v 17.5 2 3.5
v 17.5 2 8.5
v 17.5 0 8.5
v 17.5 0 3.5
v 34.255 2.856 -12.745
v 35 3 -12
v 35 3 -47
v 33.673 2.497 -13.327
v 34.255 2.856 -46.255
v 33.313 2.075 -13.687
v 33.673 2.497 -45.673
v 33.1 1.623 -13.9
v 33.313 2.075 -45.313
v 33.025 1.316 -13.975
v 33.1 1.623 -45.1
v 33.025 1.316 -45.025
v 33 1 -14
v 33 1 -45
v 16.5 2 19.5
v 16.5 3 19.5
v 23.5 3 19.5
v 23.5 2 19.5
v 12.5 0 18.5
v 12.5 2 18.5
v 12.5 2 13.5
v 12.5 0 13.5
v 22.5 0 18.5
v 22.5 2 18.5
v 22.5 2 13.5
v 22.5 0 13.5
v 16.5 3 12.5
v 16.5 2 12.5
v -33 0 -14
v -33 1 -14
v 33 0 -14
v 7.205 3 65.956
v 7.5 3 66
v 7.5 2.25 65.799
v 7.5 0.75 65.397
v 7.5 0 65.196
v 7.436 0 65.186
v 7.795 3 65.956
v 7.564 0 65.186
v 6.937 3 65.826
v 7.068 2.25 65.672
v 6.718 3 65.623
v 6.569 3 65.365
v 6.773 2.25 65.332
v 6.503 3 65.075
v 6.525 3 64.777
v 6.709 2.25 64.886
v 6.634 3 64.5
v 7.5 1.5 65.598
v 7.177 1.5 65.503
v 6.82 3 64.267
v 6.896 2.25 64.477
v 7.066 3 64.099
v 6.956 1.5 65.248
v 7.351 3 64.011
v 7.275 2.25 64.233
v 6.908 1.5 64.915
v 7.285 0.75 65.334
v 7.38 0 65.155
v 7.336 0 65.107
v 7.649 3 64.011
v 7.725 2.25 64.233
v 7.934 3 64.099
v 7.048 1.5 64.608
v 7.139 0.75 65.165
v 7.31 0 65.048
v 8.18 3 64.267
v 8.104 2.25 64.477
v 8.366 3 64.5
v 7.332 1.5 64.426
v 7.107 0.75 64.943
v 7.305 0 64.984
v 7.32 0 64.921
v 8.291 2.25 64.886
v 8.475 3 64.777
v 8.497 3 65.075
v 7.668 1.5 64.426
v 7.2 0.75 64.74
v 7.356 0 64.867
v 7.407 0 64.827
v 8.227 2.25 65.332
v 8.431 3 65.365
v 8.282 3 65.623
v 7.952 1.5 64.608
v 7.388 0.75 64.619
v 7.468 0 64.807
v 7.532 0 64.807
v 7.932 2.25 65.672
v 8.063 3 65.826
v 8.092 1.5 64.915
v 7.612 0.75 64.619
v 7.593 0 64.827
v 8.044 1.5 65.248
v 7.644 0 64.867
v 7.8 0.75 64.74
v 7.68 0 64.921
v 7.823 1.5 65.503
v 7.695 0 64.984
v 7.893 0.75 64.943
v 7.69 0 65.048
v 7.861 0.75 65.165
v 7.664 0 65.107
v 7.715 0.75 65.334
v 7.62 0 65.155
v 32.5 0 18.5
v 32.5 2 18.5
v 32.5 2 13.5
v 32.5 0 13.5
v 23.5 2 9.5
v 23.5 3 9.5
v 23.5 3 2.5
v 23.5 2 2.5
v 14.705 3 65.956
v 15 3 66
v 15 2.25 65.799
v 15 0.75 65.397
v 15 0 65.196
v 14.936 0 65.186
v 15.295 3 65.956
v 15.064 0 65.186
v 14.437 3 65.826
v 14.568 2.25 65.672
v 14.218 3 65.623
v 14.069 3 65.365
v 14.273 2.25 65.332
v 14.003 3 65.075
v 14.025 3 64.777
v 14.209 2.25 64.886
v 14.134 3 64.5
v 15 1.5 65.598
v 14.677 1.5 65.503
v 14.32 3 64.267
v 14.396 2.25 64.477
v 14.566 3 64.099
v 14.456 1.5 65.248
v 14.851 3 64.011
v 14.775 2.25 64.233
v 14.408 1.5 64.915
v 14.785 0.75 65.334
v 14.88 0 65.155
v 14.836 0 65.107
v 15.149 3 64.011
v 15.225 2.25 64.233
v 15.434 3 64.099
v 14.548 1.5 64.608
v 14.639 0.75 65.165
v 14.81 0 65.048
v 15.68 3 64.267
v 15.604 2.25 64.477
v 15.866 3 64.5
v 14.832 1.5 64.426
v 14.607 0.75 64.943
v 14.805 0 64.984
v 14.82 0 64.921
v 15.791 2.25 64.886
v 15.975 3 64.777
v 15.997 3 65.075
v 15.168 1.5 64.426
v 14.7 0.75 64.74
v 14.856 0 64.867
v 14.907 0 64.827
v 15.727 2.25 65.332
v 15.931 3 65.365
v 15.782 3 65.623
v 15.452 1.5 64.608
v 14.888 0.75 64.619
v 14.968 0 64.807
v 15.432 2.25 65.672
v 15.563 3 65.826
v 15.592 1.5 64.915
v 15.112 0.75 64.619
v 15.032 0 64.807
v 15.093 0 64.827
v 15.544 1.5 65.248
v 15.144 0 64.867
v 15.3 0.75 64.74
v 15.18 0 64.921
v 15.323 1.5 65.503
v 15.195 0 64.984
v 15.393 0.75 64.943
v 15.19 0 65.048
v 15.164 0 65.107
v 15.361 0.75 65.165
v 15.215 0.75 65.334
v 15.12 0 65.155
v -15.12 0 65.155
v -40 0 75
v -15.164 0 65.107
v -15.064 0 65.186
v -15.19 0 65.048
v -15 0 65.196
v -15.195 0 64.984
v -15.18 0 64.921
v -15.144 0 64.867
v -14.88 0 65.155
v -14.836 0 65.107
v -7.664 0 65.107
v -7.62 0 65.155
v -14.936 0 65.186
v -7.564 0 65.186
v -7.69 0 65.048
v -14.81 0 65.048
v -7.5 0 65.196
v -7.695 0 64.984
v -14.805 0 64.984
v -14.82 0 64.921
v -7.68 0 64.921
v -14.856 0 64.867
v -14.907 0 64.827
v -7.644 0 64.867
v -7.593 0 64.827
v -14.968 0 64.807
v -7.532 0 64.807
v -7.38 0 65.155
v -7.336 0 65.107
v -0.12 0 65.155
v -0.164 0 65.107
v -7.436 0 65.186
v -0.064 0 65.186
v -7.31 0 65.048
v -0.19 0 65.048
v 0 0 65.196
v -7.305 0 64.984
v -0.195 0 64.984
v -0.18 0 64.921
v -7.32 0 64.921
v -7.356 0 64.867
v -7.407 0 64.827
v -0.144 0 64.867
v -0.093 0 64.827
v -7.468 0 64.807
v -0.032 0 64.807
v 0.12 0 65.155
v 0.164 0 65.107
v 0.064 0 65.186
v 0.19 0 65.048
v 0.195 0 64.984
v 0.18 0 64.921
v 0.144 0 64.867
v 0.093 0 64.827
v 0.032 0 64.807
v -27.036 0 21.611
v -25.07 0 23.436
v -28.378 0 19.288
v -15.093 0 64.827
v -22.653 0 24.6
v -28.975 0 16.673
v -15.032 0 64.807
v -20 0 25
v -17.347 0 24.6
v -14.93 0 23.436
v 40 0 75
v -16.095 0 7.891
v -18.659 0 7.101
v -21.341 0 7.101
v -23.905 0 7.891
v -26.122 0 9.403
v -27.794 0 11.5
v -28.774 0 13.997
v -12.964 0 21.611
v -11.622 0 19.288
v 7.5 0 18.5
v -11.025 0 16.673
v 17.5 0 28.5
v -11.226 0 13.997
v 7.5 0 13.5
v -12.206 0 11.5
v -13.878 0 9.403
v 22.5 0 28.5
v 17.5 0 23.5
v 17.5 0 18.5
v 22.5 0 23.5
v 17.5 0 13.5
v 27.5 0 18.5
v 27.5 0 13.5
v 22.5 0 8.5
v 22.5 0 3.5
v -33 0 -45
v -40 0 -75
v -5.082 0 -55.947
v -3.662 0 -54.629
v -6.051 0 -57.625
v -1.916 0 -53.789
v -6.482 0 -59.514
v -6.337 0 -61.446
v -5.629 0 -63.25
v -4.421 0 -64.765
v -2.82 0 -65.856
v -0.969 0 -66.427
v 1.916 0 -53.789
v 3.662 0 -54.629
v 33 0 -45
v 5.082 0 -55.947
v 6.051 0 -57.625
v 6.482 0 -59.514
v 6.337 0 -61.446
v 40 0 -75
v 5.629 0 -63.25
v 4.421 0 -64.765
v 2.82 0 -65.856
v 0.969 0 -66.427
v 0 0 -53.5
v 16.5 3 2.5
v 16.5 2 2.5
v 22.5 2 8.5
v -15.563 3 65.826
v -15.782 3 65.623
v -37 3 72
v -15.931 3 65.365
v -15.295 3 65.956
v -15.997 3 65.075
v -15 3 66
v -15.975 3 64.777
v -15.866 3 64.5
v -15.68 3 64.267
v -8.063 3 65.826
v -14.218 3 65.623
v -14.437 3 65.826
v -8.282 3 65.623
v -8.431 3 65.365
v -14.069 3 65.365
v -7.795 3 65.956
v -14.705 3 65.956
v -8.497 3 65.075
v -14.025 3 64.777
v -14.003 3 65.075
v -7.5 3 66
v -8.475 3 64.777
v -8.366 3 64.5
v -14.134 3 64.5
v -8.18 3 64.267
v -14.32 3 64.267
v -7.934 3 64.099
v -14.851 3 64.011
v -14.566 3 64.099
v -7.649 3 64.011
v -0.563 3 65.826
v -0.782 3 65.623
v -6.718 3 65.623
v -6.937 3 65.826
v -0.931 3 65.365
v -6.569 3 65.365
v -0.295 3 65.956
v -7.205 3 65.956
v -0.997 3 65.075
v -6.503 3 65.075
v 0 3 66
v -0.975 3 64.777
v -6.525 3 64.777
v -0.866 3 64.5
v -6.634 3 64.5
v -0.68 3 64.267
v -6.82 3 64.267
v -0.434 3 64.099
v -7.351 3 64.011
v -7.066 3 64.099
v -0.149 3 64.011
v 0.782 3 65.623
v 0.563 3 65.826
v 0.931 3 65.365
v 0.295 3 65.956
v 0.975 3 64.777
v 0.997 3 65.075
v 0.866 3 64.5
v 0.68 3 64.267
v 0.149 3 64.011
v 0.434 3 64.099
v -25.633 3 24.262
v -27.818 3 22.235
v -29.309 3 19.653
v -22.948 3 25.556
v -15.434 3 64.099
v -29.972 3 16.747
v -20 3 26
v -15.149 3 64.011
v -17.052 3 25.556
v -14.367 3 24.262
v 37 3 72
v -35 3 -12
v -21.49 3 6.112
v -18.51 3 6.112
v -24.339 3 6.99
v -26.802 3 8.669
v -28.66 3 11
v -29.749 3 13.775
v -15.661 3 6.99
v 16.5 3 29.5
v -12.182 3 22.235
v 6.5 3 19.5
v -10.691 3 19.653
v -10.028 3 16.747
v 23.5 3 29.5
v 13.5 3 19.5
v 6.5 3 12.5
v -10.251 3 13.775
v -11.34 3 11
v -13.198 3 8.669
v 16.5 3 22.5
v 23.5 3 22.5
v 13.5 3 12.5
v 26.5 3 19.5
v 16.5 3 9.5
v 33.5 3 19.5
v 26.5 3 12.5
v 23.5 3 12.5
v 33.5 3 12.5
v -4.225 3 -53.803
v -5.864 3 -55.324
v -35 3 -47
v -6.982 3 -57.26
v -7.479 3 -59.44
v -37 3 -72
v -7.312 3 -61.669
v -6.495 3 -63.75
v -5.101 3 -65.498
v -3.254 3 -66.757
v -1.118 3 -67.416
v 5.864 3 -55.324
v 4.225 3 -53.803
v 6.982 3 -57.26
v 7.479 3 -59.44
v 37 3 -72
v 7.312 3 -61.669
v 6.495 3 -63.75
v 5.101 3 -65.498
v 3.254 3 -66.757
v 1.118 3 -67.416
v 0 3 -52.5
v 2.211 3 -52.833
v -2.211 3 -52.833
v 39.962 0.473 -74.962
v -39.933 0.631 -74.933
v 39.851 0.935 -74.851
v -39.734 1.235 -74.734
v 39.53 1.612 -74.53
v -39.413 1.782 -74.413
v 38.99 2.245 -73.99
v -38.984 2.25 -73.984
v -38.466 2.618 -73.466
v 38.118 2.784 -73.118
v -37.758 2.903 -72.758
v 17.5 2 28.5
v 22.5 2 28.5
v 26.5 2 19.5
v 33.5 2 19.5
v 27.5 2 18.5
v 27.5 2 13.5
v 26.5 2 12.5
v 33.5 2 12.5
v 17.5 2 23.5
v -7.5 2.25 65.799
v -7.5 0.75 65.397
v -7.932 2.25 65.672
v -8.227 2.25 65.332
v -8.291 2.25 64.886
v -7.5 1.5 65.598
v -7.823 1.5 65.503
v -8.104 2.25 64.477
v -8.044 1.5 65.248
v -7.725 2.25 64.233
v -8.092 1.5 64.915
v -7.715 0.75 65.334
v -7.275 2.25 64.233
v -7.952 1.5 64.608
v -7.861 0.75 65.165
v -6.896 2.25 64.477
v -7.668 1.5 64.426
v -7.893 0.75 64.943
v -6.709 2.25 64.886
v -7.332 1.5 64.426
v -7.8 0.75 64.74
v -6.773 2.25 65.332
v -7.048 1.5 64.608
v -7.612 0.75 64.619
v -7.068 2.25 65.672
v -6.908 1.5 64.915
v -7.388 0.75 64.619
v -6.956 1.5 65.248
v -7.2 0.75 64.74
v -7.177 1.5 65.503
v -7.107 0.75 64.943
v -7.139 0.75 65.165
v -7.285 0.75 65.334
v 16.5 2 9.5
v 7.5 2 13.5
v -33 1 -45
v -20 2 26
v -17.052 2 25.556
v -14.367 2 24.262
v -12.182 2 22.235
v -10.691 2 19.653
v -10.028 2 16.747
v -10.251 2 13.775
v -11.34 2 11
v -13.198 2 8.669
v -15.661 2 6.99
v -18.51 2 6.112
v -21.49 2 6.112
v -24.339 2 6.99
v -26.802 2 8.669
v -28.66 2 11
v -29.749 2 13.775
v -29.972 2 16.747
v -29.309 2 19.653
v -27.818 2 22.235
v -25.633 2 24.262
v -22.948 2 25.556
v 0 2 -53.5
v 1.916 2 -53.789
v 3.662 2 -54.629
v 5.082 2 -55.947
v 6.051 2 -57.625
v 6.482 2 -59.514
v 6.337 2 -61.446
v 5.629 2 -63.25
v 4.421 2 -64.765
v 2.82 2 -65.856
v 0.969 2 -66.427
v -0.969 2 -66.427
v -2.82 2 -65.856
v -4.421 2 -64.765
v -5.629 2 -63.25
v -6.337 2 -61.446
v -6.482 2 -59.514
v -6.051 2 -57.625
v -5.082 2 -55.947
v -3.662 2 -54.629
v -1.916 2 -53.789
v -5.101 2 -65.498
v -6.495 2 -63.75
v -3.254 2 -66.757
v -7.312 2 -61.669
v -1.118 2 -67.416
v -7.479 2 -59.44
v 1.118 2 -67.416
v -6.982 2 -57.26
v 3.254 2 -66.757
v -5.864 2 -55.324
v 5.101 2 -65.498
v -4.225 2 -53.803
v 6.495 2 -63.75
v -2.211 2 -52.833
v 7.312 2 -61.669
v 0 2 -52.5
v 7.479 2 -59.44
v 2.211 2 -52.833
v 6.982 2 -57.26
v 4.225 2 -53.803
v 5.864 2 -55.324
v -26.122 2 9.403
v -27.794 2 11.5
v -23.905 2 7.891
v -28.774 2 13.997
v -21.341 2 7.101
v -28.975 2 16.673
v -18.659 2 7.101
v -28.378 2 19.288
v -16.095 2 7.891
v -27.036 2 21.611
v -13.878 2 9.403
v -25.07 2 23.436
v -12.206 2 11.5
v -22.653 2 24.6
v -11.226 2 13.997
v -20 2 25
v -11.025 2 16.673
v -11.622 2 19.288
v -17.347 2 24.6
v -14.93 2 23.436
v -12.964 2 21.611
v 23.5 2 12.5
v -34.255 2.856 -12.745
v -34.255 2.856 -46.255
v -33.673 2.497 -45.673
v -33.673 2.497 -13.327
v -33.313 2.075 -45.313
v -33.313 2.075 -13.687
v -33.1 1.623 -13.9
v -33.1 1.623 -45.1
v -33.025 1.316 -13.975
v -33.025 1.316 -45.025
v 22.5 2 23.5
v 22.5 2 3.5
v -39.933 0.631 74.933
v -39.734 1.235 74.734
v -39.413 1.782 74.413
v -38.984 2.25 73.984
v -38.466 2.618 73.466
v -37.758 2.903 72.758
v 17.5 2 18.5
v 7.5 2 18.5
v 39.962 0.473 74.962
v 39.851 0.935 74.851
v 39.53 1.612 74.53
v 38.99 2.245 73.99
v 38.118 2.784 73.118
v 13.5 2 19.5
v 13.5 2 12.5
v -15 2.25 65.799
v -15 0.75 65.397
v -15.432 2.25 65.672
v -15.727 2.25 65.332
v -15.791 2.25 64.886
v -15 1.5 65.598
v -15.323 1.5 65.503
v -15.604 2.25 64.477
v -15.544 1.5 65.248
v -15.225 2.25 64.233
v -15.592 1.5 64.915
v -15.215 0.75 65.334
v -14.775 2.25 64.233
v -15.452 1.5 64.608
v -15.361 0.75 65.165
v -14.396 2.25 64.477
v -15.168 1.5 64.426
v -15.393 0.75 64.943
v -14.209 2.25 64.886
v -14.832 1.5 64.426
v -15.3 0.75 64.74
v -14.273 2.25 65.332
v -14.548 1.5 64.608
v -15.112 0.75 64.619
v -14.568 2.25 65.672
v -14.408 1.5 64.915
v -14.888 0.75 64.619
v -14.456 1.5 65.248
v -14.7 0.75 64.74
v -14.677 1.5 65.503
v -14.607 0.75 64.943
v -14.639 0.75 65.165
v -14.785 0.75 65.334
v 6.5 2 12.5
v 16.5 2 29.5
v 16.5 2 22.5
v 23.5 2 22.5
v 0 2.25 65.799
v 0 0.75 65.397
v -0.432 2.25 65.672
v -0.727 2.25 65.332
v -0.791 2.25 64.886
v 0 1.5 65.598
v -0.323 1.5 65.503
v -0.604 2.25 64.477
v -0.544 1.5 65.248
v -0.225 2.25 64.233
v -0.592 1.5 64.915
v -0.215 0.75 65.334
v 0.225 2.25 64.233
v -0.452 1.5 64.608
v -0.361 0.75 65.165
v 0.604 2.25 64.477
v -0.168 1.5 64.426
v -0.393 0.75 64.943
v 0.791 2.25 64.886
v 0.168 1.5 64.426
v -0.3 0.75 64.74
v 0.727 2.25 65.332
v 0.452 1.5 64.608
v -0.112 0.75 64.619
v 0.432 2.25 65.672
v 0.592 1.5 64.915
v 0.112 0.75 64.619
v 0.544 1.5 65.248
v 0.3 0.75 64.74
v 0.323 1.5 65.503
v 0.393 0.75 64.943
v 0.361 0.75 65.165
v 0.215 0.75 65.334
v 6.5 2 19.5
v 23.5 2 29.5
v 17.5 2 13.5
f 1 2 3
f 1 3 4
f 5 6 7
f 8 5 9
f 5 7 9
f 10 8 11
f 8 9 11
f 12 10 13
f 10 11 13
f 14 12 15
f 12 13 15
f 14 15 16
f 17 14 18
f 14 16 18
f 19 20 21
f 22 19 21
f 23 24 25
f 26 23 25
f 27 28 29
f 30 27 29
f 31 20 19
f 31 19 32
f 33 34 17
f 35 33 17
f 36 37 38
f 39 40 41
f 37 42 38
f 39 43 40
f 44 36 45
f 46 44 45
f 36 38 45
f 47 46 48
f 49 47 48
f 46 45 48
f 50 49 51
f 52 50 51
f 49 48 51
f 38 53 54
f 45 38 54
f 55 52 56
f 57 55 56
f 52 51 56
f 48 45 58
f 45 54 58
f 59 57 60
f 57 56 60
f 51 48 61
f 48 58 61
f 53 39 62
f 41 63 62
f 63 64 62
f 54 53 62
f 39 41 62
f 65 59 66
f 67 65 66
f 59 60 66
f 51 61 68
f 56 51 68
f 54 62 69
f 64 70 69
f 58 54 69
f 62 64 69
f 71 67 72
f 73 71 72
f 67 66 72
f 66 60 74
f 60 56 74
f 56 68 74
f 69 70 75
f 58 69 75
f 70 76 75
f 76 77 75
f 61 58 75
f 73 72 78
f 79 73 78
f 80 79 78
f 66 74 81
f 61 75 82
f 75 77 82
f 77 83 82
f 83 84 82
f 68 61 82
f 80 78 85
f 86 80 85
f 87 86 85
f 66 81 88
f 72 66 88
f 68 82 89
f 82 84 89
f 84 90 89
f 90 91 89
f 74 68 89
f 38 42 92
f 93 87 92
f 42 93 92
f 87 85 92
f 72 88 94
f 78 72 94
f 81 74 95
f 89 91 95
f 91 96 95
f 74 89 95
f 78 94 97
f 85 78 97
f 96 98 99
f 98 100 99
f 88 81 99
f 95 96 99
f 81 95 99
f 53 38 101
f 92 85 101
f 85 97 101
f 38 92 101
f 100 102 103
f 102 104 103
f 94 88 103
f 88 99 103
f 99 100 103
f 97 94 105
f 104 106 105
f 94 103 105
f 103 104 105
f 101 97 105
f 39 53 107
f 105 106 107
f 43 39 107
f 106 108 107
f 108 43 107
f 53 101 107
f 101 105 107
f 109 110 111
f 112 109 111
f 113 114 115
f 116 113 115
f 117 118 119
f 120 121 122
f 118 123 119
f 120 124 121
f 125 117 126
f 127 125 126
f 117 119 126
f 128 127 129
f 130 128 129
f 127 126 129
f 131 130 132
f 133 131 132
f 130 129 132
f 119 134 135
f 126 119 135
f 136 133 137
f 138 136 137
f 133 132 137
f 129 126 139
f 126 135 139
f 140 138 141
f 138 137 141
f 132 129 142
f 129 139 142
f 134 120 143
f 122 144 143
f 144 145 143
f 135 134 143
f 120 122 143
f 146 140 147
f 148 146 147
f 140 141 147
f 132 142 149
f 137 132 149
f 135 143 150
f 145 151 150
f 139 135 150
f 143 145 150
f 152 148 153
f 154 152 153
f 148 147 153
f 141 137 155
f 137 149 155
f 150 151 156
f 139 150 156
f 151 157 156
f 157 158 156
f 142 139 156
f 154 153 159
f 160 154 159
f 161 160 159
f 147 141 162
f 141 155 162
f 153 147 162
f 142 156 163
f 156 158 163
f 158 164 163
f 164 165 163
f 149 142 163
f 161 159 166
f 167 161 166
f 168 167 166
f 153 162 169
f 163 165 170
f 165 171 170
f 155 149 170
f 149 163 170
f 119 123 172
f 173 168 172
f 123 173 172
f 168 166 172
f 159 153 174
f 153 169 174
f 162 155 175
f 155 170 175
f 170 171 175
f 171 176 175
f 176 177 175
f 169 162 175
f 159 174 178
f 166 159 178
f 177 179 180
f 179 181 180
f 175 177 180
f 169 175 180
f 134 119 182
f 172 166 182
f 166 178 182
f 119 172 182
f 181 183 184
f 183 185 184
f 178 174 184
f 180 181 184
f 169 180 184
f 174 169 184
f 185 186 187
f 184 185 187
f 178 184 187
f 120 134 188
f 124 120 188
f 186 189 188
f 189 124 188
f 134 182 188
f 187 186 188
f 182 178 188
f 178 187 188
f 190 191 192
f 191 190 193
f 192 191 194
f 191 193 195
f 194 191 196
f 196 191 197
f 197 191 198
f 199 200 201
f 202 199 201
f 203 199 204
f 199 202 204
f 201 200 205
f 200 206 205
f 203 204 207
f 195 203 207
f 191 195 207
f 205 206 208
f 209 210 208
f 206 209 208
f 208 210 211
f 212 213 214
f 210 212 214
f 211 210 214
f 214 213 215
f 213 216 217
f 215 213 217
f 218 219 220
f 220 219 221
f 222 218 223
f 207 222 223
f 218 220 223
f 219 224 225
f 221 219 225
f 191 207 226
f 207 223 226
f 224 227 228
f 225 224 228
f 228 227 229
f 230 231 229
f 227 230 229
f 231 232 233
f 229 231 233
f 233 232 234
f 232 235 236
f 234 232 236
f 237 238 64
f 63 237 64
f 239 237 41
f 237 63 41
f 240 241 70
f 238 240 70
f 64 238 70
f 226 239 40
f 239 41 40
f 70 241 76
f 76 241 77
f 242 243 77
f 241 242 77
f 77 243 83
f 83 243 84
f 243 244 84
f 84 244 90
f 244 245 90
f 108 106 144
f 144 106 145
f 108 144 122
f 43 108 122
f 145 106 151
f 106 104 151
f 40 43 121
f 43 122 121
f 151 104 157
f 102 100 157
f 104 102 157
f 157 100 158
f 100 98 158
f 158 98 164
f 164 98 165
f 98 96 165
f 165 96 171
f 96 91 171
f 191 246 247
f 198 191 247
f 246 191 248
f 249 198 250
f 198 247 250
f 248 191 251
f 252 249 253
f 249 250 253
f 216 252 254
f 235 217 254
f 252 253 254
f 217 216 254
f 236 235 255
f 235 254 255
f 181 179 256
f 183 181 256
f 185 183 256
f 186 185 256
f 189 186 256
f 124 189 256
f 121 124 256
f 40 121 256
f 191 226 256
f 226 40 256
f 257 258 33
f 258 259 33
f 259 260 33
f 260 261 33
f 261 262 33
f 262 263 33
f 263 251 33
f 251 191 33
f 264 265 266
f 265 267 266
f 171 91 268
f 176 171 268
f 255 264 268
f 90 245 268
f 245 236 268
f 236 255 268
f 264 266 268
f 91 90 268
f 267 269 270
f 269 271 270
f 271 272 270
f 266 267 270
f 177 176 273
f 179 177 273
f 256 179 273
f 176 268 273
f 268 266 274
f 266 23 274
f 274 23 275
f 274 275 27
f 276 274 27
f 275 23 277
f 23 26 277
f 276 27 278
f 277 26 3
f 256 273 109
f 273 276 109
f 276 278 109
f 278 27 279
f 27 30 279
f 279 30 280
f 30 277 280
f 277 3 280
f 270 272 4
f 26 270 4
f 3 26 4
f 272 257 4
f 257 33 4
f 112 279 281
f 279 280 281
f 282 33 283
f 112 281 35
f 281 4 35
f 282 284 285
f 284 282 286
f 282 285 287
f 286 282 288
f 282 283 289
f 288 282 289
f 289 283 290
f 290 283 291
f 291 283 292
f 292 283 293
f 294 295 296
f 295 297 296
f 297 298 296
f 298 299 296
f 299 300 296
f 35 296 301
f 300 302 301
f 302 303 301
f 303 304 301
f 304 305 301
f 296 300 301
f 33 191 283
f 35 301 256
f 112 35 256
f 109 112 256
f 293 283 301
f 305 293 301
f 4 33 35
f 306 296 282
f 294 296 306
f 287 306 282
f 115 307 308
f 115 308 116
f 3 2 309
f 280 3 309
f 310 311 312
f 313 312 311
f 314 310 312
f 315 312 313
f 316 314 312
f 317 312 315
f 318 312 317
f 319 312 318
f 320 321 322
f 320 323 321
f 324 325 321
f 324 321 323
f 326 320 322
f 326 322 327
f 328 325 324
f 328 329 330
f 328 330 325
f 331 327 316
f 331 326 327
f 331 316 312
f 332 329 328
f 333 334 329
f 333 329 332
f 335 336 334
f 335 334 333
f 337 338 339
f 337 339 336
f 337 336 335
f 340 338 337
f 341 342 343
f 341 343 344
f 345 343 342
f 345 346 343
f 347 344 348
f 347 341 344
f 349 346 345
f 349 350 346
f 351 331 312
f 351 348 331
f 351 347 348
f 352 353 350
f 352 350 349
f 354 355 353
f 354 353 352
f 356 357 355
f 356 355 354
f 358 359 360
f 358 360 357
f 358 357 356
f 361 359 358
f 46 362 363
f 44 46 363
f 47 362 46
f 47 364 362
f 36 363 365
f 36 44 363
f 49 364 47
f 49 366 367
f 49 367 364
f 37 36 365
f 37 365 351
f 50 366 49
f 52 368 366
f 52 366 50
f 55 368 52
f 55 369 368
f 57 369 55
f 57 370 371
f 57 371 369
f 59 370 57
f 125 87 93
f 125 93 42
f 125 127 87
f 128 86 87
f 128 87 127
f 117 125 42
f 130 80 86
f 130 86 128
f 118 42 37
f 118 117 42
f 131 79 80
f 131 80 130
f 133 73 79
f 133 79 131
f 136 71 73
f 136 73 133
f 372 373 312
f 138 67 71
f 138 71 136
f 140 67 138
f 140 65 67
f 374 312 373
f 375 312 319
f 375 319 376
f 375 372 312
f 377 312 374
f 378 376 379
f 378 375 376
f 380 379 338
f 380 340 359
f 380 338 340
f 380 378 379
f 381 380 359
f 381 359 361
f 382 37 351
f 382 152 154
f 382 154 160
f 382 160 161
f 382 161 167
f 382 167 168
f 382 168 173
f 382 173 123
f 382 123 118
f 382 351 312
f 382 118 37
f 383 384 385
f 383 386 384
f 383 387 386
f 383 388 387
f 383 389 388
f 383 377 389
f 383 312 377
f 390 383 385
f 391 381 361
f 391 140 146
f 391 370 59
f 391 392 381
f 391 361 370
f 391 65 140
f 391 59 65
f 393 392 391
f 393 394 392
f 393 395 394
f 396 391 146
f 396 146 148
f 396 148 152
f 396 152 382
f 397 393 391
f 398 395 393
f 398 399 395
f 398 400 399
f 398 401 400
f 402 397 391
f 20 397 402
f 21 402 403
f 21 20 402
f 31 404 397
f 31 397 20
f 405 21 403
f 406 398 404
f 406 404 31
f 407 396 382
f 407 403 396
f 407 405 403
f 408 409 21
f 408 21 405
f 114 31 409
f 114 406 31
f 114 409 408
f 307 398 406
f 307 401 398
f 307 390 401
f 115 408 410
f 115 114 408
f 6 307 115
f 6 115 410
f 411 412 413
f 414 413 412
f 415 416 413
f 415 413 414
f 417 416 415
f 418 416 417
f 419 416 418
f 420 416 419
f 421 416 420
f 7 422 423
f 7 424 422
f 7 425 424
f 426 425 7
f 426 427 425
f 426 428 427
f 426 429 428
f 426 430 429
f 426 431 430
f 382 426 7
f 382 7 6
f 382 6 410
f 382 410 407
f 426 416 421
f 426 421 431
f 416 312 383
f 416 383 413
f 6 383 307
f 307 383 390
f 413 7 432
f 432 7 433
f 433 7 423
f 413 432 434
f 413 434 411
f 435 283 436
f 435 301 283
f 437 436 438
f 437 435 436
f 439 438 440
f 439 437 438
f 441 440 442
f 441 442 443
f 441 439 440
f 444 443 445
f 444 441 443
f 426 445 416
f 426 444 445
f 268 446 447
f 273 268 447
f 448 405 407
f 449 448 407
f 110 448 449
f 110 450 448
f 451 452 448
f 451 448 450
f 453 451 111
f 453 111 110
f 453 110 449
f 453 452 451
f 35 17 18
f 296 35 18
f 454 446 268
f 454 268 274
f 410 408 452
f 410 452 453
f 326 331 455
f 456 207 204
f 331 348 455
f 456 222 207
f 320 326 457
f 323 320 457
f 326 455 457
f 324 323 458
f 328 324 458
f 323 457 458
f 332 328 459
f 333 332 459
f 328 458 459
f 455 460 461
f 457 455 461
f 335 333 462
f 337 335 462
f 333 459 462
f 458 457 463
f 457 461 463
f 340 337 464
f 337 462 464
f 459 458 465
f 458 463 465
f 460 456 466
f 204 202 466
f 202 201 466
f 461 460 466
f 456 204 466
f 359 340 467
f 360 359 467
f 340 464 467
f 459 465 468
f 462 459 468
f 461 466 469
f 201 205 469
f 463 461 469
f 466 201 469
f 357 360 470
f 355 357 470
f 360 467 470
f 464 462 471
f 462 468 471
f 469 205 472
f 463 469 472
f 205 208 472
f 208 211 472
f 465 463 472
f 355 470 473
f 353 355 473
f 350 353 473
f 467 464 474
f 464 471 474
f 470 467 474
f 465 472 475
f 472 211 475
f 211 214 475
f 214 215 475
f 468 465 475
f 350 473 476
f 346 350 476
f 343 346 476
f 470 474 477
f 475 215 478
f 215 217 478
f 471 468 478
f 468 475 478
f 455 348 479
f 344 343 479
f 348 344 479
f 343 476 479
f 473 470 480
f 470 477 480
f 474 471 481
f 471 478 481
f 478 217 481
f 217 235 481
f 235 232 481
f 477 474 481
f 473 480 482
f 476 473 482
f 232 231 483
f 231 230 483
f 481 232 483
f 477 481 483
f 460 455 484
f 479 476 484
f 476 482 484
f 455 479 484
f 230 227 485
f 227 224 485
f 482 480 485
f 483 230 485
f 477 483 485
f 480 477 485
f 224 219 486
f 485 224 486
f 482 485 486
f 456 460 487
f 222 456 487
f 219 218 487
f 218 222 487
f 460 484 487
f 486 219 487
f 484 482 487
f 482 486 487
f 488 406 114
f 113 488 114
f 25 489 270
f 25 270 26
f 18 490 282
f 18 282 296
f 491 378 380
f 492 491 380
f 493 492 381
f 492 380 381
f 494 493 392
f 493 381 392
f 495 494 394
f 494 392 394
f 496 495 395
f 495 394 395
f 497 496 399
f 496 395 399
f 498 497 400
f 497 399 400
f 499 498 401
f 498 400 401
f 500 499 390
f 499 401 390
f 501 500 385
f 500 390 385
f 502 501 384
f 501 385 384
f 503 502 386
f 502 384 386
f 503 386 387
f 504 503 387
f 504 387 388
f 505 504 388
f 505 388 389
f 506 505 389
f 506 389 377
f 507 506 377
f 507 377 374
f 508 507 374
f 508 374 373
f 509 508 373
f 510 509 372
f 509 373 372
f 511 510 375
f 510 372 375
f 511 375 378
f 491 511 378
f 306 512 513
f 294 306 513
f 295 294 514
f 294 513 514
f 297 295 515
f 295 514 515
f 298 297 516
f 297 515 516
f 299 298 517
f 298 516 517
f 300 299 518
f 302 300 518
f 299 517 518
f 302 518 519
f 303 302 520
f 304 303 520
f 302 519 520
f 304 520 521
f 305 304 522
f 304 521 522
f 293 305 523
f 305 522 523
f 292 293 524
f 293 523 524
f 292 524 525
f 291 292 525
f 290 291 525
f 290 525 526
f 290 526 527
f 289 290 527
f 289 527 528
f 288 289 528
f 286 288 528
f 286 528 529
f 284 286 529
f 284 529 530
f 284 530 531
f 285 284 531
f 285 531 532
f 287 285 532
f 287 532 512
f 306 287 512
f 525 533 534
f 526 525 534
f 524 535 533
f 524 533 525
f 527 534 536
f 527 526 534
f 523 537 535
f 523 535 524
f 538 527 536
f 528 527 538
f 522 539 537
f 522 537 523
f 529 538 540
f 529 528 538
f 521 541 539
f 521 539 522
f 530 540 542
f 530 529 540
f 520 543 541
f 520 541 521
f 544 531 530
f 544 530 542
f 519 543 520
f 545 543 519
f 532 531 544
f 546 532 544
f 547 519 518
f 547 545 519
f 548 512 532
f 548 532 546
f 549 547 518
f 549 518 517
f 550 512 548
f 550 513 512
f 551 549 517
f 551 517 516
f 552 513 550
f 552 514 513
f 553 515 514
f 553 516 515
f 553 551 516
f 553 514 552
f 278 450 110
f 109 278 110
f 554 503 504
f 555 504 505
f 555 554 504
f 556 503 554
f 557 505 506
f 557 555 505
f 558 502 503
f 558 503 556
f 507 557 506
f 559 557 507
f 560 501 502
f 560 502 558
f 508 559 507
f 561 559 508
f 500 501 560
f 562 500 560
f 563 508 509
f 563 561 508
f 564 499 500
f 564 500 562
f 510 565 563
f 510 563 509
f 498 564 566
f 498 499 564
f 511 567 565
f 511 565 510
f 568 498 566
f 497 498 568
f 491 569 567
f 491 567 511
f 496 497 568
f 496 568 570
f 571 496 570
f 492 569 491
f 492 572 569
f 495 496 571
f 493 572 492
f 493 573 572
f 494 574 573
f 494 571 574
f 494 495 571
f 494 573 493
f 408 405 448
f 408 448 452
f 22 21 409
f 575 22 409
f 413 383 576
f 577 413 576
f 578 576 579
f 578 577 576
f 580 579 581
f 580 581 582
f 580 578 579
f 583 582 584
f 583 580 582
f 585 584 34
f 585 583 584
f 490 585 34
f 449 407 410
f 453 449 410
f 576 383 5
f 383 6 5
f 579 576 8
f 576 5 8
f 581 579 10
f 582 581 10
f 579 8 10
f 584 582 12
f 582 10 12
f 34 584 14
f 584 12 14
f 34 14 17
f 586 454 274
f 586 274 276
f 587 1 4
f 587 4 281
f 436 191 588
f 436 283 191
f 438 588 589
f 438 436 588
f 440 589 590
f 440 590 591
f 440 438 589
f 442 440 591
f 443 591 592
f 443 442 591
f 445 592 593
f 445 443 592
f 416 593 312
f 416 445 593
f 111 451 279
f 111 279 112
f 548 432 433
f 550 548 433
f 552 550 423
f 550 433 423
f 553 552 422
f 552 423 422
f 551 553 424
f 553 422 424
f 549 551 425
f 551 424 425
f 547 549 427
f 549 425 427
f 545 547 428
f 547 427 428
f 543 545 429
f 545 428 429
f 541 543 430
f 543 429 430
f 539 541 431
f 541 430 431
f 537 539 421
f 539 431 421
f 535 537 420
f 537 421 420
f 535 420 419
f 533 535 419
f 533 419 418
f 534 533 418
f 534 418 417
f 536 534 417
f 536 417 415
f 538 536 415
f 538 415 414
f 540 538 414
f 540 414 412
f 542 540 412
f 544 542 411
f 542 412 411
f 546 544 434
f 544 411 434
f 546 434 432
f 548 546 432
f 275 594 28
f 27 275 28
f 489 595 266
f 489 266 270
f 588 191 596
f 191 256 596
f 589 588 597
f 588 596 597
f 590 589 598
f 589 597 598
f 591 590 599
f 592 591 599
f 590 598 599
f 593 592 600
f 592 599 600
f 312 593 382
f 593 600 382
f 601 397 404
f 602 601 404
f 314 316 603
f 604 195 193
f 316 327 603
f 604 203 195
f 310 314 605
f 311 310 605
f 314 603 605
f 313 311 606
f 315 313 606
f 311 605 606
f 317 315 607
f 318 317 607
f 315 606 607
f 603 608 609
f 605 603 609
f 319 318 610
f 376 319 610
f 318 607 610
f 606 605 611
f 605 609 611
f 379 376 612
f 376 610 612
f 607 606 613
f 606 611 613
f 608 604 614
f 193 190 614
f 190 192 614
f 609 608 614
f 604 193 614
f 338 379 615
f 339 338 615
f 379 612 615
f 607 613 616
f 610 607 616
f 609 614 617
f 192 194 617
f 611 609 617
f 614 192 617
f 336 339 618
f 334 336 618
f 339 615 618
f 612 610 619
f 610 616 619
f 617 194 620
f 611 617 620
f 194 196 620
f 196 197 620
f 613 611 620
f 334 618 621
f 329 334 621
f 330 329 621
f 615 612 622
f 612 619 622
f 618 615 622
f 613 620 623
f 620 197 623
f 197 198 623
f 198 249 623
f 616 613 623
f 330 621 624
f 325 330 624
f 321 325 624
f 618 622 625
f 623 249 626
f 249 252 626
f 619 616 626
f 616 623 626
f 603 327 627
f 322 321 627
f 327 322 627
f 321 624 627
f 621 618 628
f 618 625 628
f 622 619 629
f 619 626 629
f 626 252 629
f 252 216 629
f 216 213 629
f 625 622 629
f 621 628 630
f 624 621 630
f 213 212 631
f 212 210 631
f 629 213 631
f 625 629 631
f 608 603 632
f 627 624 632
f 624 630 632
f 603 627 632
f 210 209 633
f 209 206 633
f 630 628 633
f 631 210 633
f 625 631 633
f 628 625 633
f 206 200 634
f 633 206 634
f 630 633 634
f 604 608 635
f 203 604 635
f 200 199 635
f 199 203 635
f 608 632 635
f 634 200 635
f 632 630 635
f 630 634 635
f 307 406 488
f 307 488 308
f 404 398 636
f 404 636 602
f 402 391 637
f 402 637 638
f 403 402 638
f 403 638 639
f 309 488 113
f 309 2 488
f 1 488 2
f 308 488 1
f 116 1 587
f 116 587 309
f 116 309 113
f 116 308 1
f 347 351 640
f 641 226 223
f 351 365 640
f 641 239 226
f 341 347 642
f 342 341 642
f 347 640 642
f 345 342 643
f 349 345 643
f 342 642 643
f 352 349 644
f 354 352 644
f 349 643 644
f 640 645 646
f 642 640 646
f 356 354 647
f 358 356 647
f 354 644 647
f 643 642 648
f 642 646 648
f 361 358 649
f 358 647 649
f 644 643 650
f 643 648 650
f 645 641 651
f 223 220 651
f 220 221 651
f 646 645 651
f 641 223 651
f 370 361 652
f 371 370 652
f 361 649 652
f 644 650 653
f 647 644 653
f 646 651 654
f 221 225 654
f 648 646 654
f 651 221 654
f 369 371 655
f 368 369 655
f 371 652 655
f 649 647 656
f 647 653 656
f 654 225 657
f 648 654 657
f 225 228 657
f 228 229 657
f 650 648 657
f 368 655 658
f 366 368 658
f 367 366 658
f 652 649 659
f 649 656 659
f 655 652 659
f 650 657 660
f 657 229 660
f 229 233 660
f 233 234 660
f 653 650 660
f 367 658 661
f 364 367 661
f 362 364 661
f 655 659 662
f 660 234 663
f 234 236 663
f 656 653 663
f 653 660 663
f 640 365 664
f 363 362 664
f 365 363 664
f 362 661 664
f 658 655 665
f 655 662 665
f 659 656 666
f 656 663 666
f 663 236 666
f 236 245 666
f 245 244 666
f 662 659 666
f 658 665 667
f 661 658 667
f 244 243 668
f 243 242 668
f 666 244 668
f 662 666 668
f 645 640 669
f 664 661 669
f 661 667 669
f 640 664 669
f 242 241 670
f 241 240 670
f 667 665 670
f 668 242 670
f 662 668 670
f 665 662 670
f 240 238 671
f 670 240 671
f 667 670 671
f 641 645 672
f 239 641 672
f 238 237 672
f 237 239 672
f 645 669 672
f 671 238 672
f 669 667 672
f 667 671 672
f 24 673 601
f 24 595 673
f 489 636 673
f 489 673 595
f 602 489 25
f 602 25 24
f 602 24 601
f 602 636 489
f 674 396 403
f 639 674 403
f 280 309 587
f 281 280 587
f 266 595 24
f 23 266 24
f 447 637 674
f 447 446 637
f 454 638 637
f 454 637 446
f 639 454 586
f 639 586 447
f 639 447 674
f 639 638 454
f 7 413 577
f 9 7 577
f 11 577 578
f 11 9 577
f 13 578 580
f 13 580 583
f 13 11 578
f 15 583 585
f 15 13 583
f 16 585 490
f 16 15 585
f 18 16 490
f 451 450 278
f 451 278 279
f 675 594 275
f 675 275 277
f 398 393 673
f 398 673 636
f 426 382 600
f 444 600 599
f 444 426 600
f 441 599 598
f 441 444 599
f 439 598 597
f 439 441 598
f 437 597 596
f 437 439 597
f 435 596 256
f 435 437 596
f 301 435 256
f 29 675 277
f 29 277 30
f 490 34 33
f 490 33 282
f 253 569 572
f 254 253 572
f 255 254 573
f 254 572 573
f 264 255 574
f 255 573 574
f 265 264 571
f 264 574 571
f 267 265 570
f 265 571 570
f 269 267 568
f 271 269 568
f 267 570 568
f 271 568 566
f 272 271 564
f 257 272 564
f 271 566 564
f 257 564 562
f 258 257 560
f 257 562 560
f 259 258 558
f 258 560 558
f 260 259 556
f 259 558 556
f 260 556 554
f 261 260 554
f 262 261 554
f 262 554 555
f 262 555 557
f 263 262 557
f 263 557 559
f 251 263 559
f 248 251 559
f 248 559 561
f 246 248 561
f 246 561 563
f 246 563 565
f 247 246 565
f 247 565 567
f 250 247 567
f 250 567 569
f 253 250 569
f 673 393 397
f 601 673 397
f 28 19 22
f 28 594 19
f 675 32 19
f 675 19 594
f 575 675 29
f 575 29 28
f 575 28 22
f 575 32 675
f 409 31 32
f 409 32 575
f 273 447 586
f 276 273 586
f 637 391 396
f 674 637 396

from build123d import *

# Parameters (mm, degrees)
SKETCH1_W           = 80
SKETCH1_H           = 150
BOSS_EXTRUDE1_DEPTH = 3
SKETCH2_W           = 66
SKETCH2_H           = 31
CUT_EXTRUDE1_DEPTH  = 3
SKETCH4_R           = 7.5
CUT_EXTRUDE2_DEPTH  = 1
SKETCH5_R           = 6.5
CUT_EXTRUDE3_DEPTH  = 19
SKETCH6_R           = 10
CUT_EXTRUDE4_DEPTH  = 1
SKETCH8_R           = 9
CUT_EXTRUDE5_DEPTH  = 86.023526156
SKETCH9_W           = 7
SKETCH9_H           = 7
CUT_EXTRUDE6_DEPTH  = 1
SKETCH12_W          = 5
SKETCH12_H          = 5
CUT_EXTRUDE7_DEPTH  = 86.023526156
FILLET1_R           = 3
FILLET2_R           = 2
SKETCH15_W          = 7
SKETCH15_H          = 7
CUT_EXTRUDE9_DEPTH  = 1
SKETCH16_W          = 5
SKETCH16_H          = 5
CUT_EXTRUDE10_DEPTH = 86.023526156


with BuildPart() as part:
    # Sketch1 → Boss-Extrude1 (new body)
    with BuildSketch(Plane(origin=(0, 0, 0), x_dir=(1, 0, 0), z_dir=(0, 1, 0))):
        Rectangle(SKETCH1_W, SKETCH1_H)
    extrude(amount=BOSS_EXTRUDE1_DEPTH)

    # Sketch2 → Cut-Extrude1 (cut)
    with BuildSketch(Plane(origin=(0, 3, 0), x_dir=(1, 0, 0), z_dir=(0, 1, 0))):
        with Locations((0, 29.5)):
            Rectangle(SKETCH2_W, SKETCH2_H)
    extrude(amount=-CUT_EXTRUDE1_DEPTH, mode=Mode.SUBTRACT)

    # Sketch4 → Cut-Extrude2 (cut)
    with BuildSketch(Plane(origin=(0, 3, 0), x_dir=(1, 0, 0), z_dir=(0, 1, 0))):
        with Locations(Location((0, 60, 0), (0, 0, 270))):
            Circle(SKETCH4_R)
    extrude(amount=-CUT_EXTRUDE2_DEPTH, mode=Mode.SUBTRACT)

    # Sketch5 → Cut-Extrude3 (cut)
    with BuildSketch(Plane(origin=(0, 2, 0), x_dir=(1, 0, 0), z_dir=(0, 1, 0))):
        with Locations(Location((0, 60, 0), (0, 0, 270))):
            Circle(SKETCH5_R)
    extrude(amount=-CUT_EXTRUDE3_DEPTH, mode=Mode.SUBTRACT)

    # Sketch6 → Cut-Extrude4 (cut)
    with BuildSketch(Plane(origin=(0, 3, 0), x_dir=(1, 0, 0), z_dir=(0, 1, 0))):
        with Locations(Location((-20, -16, 0), (0, 0, 270))):
            Circle(SKETCH6_R)
    extrude(amount=-CUT_EXTRUDE4_DEPTH, mode=Mode.SUBTRACT)

    # Sketch8 → Cut-Extrude5 (cut, through all)
    with BuildSketch(Plane(origin=(0, 2, 0), x_dir=(1, 0, 0), z_dir=(0, 1, 0))):
        with Locations(Location((-20, -16, 0), (0, 0, 270))):
            Circle(SKETCH8_R)
    extrude(amount=-CUT_EXTRUDE5_DEPTH, mode=Mode.SUBTRACT)

    # Sketch9 → Cut-Extrude6 (cut)
    with BuildSketch(Plane(origin=(0, 3, 0), x_dir=(1, 0, 0), z_dir=(0, 1, 0))):
        with Locations((20, -6)):
            Rectangle(SKETCH9_W, SKETCH9_H)
        with Locations((20, -26)):
            Rectangle(SKETCH9_W, SKETCH9_H)
        with Locations((10, -16)):
            Rectangle(SKETCH9_W, SKETCH9_H)
        with Locations((30, -16)):
            Rectangle(SKETCH9_W, SKETCH9_H)
    extrude(amount=-CUT_EXTRUDE6_DEPTH, mode=Mode.SUBTRACT)

    # Sketch12 → Cut-Extrude7 (cut, through all)
    with BuildSketch(Plane(origin=(0, 2, 0), x_dir=(1, 0, 0), z_dir=(0, 1, 0))):
        with Locations((20, -6)):
            Rectangle(SKETCH12_W, SKETCH12_H)
        with Locations((10, -16)):
            Rectangle(SKETCH12_W, SKETCH12_H)
        with Locations((30, -16)):
            Rectangle(SKETCH12_W, SKETCH12_H)
        with Locations((20, -26)):
            Rectangle(SKETCH12_W, SKETCH12_H)
    extrude(amount=-CUT_EXTRUDE7_DEPTH, mode=Mode.SUBTRACT)

    # Cut-Extrude8 cone 1 section (through the dimple's axis) → Cut-Extrude8 (revolve, cut)
    with BuildSketch(Plane(origin=(0, 3, 65), x_dir=(0, 0, 1), z_dir=(1, 0, 0))):
        Polygon((0, 0), (1, 0), (0, 3.732050808), align=None)
    revolve(axis=Axis((0, 3, 65), (0, -1, 0)), mode=Mode.SUBTRACT)

    # Cut-Extrude8 cone 2 section (through the dimple's axis) → Cut-Extrude8 cone 2 (revolve, cut)
    with BuildSketch(Plane(origin=(-7.5, 3, 65), x_dir=(0, 0, 1), z_dir=(1, 0, 0))):
        Polygon((0, 0), (1, 0), (0, 3.732050808), align=None)
    revolve(axis=Axis((-7.5, 3, 65), (0, -1, 0)), mode=Mode.SUBTRACT)

    # Cut-Extrude8 cone 3 section (through the dimple's axis) → Cut-Extrude8 cone 3 (revolve, cut)
    with BuildSketch(Plane(origin=(-15, 3, 65), x_dir=(0, 0, 1), z_dir=(1, 0, 0))):
        Polygon((0, 0), (1, 0), (0, 3.732050808), align=None)
    revolve(axis=Axis((-15, 3, 65), (0, -1, 0)), mode=Mode.SUBTRACT)

    # Cut-Extrude8 cone 4 section (through the dimple's axis) → Cut-Extrude8 cone 4 (revolve, cut)
    with BuildSketch(Plane(origin=(7.5, 3, 65), x_dir=(0, 0, 1), z_dir=(1, 0, 0))):
        Polygon((0, 0), (1, 0), (0, 3.732050808), align=None)
    revolve(axis=Axis((7.5, 3, 65), (0, -1, 0)), mode=Mode.SUBTRACT)

    # Cut-Extrude8 cone 5 section (through the dimple's axis) → Cut-Extrude8 cone 5 (revolve, cut)
    with BuildSketch(Plane(origin=(15, 3, 65), x_dir=(0, 0, 1), z_dir=(1, 0, 0))):
        Polygon((0, 0), (1, 0), (0, 3.732050808), align=None)
    revolve(axis=Axis((15, 3, 65), (0, -1, 0)), mode=Mode.SUBTRACT)

    # Fillet1
    fillet1_edges = [part.edges().sort_by_distance(p)[0] for p in [
        (40, 3, 0),
        (0, 3, -75),
        (-40, 3, 0),
        (0, 3, 75),
    ]]
    fillet(fillet1_edges, radius=FILLET1_R - 0.0001)  # a hair under: the kernel refuses the full size

    # Fillet2
    fillet2_edges = [part.edges().sort_by_distance(p)[0] for p in [
        (33, 3, -29.5),
        (0, 3, -45),
        (-33, 3, -29.5),
        (0, 3, -14),
    ]]
    fillet(fillet2_edges, radius=FILLET2_R)

    # Sketch15 → Cut-Extrude9 (cut)
    with BuildSketch(Plane(origin=(0, 3, 0), x_dir=(1, 0, 0), z_dir=(0, 1, 0))):
        with Locations((20, -16)):
            Rectangle(SKETCH15_W, SKETCH15_H)
    extrude(amount=-CUT_EXTRUDE9_DEPTH, mode=Mode.SUBTRACT)

    # Sketch16 → Cut-Extrude10 (cut, through all)
    with BuildSketch(Plane(origin=(0, 2, 0), x_dir=(1, 0, 0), z_dir=(0, 1, 0))):
        with Locations((20, -16)):
            Rectangle(SKETCH16_W, SKETCH16_H)
    extrude(amount=-CUT_EXTRUDE10_DEPTH, mode=Mode.SUBTRACT)


solid = part.part
